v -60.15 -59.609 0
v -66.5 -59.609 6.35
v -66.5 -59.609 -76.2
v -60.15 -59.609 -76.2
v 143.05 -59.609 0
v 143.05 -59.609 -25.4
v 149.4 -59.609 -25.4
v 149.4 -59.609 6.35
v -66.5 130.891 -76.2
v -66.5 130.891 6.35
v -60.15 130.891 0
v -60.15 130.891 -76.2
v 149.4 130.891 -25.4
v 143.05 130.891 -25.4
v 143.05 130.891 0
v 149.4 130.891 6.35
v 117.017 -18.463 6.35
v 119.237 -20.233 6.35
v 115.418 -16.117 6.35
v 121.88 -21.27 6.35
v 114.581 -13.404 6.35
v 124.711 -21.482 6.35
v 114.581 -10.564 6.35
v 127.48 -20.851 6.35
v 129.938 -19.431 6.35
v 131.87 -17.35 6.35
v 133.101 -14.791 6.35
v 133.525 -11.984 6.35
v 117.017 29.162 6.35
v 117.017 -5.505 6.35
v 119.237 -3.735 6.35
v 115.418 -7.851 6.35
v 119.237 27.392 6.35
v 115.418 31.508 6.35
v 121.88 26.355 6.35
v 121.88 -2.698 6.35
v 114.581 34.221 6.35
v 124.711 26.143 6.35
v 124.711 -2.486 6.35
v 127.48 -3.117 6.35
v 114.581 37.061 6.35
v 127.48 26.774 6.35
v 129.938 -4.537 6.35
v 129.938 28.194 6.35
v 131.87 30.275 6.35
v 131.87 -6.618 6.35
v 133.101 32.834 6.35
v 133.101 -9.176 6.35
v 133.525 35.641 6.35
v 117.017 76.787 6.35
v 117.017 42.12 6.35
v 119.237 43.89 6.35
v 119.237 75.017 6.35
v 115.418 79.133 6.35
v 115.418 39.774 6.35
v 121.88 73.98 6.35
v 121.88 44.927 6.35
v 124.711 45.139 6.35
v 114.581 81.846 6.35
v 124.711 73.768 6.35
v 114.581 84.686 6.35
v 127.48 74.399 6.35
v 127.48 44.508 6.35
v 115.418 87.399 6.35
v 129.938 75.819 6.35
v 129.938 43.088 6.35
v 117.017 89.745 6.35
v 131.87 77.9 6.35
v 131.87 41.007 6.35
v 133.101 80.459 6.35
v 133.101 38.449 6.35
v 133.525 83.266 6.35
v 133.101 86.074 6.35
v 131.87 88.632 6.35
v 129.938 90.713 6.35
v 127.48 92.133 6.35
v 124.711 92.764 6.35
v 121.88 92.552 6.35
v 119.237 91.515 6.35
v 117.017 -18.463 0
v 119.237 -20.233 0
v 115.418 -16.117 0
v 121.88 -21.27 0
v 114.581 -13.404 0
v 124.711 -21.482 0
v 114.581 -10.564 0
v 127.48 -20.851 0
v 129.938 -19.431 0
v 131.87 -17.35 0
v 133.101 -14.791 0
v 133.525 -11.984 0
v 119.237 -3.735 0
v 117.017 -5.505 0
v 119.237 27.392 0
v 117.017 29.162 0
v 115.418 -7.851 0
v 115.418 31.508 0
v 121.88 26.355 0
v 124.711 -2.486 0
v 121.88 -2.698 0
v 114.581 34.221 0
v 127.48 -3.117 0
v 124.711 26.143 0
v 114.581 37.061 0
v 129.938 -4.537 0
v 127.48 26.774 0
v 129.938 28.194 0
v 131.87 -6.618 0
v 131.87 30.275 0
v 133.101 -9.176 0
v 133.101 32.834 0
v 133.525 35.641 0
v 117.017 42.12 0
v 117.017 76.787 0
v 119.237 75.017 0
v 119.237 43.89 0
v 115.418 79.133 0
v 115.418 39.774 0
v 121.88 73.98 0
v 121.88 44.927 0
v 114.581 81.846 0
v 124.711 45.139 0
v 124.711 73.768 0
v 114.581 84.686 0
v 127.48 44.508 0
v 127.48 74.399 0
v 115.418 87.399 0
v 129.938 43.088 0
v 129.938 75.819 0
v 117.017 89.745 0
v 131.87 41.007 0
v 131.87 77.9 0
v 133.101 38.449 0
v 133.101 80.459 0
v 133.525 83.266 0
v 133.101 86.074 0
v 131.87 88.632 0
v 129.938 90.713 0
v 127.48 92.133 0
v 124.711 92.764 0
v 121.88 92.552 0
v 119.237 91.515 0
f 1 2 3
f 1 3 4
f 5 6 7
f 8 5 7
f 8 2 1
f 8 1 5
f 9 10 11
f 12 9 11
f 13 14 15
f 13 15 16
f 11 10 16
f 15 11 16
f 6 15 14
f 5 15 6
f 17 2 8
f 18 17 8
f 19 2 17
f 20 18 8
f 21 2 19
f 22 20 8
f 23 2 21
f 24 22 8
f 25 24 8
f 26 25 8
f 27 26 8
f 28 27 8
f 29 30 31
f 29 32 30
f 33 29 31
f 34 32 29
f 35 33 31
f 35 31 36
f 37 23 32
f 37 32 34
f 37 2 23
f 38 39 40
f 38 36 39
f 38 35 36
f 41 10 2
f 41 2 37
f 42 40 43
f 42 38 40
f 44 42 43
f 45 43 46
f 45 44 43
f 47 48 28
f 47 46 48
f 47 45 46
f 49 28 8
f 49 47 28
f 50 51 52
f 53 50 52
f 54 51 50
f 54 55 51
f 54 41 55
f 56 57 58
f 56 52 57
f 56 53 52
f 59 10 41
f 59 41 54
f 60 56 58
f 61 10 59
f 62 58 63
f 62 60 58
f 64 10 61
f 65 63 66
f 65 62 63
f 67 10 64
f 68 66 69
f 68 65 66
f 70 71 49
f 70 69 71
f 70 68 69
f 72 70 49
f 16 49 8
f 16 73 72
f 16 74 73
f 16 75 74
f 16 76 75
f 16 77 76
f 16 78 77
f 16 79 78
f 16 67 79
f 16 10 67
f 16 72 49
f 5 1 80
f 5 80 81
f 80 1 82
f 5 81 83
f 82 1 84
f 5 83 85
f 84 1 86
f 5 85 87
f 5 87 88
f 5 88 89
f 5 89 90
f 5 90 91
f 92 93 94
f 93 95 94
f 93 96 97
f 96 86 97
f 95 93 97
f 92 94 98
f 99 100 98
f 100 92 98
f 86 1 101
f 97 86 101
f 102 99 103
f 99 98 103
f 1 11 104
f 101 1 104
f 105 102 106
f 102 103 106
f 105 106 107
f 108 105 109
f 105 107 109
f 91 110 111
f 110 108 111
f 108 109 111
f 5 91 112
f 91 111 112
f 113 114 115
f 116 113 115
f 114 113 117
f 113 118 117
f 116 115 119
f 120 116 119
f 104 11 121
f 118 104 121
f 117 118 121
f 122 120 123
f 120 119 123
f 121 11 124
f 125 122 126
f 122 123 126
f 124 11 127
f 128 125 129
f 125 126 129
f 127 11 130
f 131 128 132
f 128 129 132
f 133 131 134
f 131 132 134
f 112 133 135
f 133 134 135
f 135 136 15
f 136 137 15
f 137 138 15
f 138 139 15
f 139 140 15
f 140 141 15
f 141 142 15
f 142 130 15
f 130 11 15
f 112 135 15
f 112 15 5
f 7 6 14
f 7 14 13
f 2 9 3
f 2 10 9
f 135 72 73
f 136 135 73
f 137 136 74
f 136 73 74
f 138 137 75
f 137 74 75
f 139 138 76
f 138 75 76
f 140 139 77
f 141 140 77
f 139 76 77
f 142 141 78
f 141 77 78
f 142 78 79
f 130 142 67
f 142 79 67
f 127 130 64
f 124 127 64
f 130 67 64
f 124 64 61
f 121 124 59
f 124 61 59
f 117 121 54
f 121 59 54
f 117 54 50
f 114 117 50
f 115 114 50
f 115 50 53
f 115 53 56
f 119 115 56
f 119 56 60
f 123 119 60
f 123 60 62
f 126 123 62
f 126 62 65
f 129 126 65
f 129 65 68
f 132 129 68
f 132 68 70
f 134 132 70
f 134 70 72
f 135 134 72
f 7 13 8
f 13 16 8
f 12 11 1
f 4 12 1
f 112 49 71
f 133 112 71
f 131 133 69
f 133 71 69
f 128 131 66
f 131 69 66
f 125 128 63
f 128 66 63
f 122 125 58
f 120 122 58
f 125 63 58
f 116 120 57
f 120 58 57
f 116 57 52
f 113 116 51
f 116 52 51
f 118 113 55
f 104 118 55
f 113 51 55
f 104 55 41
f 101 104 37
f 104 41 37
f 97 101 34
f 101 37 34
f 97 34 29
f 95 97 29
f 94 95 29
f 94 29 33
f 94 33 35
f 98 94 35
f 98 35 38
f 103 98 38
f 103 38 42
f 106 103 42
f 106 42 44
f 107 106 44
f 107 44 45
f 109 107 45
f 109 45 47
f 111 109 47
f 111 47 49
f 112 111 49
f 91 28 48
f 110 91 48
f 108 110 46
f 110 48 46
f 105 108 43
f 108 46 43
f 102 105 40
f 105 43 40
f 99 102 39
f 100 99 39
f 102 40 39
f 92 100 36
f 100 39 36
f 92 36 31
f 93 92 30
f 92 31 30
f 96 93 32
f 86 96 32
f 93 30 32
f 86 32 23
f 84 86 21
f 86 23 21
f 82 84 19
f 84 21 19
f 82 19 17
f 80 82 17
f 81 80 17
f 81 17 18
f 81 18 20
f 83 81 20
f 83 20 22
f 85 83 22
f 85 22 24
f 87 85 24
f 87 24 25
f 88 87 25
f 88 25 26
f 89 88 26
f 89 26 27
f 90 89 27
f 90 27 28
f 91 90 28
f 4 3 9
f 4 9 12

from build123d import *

# Parameters (mm, degrees)
F0_W     = 215.9
F0_H     = 190.5
F1_DEPTH = 6.35
F2_R     = 9.525
F3_DEPTH = 25.4
F4_W     = 6.35
F4_H     = 190.5
F5_DEPTH = 76.2
F6_W     = 6.35
F6_H     = 190.5
F7_DEPTH = 25.4


with BuildPart() as f1:
    # F0 (on Top) → F1 (new body)
    with BuildSketch(Plane.XY):
        with Locations((41.449627, 35.641044)):
            Rectangle(F0_W, F0_H)
    extrude(amount=F1_DEPTH)

    # F2 (on face) → F3 (cut)
    with BuildSketch(Plane.XY.offset(6.35)):
        with Locations((123.999627, 83.266044)):
            Circle(F2_R)
        with Locations((123.999627, 35.641044)):
            Circle(F2_R)
        with Locations((123.999627, -11.983956)):
            Circle(F2_R)
    extrude(amount=-F3_DEPTH, mode=Mode.SUBTRACT)

    # F4 (on face) → F5 (join)
    with BuildSketch(Plane(origin=(0, 0, 0), x_dir=(1, 0, 0), z_dir=(0, 0, -1))):
        with Locations((-63.325373, -35.641044)):
            Rectangle(F4_W, F4_H)
    extrude(amount=F5_DEPTH)

    # F6 (on face) → F7 (join)
    with BuildSketch(Plane(origin=(0, 0, 0), x_dir=(1, 0, 0), z_dir=(0, 0, -1))):
        with Locations((146.224627, -35.641044)):
            Rectangle(F6_W, F6_H)
    extrude(amount=F7_DEPTH)


solid = f1.part
